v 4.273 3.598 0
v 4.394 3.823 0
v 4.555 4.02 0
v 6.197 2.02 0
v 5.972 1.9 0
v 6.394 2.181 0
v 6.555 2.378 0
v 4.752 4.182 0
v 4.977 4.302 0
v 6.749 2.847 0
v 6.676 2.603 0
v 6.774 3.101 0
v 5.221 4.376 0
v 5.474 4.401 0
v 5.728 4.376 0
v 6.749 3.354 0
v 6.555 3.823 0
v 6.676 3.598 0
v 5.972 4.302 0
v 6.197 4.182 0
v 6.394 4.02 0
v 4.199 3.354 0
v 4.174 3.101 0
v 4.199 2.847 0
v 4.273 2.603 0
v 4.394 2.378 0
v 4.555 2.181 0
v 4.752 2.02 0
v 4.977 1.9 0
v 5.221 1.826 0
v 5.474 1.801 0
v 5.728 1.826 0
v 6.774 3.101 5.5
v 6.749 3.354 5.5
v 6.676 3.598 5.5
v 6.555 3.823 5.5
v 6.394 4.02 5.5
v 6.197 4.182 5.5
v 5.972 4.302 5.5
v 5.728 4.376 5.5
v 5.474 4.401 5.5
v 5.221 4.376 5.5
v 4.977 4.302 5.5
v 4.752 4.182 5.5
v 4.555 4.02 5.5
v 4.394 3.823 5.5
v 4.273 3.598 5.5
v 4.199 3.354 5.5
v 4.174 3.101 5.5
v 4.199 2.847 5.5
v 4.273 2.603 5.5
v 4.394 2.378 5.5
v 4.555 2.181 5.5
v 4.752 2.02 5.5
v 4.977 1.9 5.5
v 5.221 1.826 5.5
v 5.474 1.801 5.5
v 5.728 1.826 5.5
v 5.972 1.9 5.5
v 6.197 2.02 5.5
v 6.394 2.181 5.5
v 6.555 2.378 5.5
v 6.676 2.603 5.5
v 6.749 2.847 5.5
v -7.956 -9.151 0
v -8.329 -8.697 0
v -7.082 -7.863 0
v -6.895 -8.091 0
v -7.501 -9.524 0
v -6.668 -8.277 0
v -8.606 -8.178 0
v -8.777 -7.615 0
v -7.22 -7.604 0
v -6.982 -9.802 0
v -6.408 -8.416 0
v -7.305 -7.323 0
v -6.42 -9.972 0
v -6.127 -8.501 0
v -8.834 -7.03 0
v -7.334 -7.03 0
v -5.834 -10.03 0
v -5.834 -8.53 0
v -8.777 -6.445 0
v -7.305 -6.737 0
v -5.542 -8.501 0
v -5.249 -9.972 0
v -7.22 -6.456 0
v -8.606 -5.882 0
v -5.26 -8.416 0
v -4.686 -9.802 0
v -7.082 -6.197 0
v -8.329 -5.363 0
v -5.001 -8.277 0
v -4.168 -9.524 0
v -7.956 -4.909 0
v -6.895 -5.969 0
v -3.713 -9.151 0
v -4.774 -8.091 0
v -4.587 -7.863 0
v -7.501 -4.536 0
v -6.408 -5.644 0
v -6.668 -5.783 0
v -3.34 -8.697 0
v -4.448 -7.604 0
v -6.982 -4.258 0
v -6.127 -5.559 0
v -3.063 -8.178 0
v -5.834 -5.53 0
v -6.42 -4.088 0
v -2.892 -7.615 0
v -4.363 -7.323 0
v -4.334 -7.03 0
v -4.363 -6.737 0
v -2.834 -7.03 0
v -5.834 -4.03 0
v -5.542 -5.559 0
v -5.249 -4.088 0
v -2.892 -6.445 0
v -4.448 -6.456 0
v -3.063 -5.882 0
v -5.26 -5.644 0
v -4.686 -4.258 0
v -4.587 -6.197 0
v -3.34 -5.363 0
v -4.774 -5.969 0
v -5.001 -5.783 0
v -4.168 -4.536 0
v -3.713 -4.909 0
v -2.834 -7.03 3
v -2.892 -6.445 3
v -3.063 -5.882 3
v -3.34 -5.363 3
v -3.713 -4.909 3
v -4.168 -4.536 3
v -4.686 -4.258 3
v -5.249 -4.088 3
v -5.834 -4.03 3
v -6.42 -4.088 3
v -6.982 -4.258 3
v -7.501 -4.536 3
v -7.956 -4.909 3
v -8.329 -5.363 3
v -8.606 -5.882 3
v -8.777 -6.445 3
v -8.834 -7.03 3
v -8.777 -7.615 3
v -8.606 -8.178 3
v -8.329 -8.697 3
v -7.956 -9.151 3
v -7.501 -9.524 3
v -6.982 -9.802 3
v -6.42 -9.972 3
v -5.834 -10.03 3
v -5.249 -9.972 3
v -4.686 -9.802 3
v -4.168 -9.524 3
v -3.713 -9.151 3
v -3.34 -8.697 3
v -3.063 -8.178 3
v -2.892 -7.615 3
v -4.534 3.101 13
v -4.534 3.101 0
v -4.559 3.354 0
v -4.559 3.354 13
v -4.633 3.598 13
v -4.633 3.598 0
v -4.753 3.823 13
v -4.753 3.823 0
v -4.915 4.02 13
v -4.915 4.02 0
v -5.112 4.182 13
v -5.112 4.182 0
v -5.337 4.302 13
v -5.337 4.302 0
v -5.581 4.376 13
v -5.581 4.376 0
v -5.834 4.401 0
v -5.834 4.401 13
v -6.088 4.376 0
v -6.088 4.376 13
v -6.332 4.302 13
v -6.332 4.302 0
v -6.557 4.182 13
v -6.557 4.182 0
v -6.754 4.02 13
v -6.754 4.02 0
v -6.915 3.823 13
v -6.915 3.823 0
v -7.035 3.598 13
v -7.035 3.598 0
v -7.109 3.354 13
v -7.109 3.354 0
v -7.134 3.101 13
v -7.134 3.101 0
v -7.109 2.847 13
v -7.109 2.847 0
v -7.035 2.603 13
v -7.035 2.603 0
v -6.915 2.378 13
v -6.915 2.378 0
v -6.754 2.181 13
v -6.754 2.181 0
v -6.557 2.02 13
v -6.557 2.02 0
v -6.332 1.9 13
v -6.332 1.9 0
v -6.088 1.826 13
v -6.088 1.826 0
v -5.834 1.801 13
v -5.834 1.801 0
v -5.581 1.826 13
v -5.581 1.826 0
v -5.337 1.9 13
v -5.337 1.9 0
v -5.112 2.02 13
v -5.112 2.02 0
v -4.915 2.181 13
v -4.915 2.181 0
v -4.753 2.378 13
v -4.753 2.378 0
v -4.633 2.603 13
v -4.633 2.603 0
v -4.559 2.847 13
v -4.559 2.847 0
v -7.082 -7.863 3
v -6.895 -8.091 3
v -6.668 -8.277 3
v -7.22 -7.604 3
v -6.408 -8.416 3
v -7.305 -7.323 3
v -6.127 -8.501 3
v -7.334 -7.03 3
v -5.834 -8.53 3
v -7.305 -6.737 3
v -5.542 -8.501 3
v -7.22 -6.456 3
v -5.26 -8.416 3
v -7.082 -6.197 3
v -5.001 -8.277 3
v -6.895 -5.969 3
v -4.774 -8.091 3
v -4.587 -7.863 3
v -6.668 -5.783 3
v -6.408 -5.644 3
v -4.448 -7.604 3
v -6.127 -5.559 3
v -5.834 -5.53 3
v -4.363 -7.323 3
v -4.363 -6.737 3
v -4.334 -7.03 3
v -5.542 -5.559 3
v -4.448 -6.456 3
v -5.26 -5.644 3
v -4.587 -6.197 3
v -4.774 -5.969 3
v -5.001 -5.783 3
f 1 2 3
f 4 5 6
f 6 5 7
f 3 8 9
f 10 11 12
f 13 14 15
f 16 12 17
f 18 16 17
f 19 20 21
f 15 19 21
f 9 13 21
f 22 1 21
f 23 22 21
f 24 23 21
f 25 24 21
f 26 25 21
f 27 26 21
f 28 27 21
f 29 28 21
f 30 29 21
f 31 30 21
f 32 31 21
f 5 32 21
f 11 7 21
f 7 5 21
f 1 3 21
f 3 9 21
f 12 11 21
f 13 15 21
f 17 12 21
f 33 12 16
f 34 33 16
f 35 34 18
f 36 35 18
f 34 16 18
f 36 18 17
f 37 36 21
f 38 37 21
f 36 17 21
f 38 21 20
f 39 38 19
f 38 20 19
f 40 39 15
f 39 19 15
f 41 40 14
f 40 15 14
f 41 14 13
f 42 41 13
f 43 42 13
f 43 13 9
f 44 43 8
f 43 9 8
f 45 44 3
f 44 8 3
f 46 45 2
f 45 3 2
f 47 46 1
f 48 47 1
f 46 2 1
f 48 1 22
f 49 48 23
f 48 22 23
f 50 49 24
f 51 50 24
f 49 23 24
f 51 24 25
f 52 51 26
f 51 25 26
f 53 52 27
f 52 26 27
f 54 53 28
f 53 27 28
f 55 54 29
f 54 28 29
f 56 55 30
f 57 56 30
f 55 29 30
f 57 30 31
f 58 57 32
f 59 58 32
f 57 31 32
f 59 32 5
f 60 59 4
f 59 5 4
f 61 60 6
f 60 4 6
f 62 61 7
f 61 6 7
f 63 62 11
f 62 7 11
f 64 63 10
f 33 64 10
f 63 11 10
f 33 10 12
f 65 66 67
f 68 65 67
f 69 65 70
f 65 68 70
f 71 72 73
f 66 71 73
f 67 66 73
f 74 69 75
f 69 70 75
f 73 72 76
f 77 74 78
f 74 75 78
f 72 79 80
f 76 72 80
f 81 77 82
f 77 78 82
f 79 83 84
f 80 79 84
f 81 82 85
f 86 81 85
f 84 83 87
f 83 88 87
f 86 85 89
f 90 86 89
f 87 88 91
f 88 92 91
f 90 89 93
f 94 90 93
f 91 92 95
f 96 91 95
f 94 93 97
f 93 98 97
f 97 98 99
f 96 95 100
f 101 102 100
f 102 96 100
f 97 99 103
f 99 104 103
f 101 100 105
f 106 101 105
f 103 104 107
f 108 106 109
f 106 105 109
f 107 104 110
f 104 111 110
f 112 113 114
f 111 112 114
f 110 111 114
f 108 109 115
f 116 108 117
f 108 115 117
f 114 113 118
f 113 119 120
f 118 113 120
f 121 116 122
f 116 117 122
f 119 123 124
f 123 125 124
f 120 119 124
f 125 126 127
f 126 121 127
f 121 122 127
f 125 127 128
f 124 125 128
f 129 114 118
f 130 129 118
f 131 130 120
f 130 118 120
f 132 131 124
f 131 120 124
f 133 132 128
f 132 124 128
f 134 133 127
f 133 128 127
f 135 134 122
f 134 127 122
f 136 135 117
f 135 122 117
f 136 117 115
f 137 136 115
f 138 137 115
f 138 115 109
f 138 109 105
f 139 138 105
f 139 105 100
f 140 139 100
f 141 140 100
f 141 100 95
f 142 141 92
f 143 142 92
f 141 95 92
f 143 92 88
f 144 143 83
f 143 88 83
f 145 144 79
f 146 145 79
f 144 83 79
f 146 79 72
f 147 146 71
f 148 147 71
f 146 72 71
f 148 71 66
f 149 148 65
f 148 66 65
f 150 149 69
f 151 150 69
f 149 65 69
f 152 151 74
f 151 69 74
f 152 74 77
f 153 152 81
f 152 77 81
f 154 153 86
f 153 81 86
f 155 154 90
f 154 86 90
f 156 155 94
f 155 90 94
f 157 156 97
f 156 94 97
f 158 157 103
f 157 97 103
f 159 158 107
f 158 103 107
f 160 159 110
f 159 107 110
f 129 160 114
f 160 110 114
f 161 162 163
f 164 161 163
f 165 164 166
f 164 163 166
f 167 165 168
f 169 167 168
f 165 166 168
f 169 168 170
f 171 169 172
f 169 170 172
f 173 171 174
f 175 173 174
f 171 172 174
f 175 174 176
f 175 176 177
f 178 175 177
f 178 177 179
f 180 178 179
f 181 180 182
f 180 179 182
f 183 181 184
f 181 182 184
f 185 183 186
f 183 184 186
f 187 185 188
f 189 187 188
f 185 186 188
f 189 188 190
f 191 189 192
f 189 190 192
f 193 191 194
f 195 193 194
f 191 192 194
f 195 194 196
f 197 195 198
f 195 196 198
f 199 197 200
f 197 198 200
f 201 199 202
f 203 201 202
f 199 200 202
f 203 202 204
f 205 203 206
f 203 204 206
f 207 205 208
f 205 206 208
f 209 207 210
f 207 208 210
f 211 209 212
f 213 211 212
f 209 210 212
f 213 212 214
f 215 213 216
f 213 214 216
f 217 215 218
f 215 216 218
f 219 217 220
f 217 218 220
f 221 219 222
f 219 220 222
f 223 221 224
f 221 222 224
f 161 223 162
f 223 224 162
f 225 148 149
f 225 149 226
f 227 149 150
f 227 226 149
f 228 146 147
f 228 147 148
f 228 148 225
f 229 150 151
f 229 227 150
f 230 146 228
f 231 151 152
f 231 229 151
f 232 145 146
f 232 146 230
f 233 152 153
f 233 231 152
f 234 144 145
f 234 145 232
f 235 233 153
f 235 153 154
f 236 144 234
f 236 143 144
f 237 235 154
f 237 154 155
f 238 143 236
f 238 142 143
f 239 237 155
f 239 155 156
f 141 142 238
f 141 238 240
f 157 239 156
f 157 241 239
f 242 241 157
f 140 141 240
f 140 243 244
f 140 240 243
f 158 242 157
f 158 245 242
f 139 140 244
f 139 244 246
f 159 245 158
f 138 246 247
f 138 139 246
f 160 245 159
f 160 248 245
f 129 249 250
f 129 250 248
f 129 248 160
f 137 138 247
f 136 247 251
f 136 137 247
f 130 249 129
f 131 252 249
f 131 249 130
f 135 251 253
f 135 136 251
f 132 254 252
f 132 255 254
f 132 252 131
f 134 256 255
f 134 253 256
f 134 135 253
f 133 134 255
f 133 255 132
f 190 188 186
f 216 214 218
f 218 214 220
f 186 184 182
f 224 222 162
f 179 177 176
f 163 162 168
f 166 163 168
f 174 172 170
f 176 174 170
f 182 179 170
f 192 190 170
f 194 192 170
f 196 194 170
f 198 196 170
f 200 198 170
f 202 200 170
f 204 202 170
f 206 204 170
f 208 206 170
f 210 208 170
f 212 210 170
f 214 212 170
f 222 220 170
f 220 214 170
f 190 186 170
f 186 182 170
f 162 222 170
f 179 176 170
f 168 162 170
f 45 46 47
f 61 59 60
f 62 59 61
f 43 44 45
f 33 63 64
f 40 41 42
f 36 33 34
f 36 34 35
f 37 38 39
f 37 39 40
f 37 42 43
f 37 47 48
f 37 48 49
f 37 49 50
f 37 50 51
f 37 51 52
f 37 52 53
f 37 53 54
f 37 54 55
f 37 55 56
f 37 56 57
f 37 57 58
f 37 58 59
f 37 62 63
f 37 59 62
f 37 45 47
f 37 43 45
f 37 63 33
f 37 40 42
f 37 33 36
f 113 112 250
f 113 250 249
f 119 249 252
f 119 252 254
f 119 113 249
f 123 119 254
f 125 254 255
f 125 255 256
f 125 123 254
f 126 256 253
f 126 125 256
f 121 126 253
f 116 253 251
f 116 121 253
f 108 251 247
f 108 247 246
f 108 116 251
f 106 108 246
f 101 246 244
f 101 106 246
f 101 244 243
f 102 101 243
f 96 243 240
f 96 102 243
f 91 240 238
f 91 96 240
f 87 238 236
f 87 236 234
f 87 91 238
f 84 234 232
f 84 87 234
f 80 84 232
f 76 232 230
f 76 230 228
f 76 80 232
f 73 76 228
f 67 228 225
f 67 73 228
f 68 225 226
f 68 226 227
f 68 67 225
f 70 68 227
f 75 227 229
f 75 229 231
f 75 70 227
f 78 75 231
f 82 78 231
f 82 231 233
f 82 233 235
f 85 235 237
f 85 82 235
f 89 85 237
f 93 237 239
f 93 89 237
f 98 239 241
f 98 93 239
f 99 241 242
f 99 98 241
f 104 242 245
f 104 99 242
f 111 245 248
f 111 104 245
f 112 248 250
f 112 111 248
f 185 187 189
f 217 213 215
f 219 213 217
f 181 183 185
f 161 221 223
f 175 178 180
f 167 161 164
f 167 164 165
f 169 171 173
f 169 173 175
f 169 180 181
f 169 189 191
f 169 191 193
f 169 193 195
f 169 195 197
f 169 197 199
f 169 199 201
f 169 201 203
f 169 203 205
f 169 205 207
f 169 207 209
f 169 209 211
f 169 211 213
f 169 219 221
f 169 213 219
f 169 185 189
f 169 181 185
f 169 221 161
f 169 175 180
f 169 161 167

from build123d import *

# Parameters (mm, degrees)
F0_R     = 1.3
F1_DEPTH = 5.5
F2_DEPTH = 13
F0_R_2   = 3
F0_R_3   = 1.5
F3_DEPTH = 3


with BuildPart() as f1:
    # F0 (on Top) → F1 (new body)
    with BuildSketch(Plane.XY):
        with Locations((5.474466, 3.100654)):
            Circle(F0_R)
    extrude(amount=F1_DEPTH)


with BuildPart() as f2:
    # F0 (on Top) → F2 (new body)
    with BuildSketch(Plane.XY):
        with Locations((-5.834304, 3.100654)):
            Circle(F0_R)
    extrude(amount=F2_DEPTH)


with BuildPart() as f3:
    # F0 (on Top) → F3 (new body)
    with BuildSketch(Plane.XY):
        with Locations((-5.834304, -7.029991)):
            Circle(F0_R_2)
        with Locations((-5.834304, -7.029991)):
            Circle(F0_R_3, mode=Mode.SUBTRACT)
    extrude(amount=F3_DEPTH)


solid = Compound([f1.part, f2.part, f3.part])
